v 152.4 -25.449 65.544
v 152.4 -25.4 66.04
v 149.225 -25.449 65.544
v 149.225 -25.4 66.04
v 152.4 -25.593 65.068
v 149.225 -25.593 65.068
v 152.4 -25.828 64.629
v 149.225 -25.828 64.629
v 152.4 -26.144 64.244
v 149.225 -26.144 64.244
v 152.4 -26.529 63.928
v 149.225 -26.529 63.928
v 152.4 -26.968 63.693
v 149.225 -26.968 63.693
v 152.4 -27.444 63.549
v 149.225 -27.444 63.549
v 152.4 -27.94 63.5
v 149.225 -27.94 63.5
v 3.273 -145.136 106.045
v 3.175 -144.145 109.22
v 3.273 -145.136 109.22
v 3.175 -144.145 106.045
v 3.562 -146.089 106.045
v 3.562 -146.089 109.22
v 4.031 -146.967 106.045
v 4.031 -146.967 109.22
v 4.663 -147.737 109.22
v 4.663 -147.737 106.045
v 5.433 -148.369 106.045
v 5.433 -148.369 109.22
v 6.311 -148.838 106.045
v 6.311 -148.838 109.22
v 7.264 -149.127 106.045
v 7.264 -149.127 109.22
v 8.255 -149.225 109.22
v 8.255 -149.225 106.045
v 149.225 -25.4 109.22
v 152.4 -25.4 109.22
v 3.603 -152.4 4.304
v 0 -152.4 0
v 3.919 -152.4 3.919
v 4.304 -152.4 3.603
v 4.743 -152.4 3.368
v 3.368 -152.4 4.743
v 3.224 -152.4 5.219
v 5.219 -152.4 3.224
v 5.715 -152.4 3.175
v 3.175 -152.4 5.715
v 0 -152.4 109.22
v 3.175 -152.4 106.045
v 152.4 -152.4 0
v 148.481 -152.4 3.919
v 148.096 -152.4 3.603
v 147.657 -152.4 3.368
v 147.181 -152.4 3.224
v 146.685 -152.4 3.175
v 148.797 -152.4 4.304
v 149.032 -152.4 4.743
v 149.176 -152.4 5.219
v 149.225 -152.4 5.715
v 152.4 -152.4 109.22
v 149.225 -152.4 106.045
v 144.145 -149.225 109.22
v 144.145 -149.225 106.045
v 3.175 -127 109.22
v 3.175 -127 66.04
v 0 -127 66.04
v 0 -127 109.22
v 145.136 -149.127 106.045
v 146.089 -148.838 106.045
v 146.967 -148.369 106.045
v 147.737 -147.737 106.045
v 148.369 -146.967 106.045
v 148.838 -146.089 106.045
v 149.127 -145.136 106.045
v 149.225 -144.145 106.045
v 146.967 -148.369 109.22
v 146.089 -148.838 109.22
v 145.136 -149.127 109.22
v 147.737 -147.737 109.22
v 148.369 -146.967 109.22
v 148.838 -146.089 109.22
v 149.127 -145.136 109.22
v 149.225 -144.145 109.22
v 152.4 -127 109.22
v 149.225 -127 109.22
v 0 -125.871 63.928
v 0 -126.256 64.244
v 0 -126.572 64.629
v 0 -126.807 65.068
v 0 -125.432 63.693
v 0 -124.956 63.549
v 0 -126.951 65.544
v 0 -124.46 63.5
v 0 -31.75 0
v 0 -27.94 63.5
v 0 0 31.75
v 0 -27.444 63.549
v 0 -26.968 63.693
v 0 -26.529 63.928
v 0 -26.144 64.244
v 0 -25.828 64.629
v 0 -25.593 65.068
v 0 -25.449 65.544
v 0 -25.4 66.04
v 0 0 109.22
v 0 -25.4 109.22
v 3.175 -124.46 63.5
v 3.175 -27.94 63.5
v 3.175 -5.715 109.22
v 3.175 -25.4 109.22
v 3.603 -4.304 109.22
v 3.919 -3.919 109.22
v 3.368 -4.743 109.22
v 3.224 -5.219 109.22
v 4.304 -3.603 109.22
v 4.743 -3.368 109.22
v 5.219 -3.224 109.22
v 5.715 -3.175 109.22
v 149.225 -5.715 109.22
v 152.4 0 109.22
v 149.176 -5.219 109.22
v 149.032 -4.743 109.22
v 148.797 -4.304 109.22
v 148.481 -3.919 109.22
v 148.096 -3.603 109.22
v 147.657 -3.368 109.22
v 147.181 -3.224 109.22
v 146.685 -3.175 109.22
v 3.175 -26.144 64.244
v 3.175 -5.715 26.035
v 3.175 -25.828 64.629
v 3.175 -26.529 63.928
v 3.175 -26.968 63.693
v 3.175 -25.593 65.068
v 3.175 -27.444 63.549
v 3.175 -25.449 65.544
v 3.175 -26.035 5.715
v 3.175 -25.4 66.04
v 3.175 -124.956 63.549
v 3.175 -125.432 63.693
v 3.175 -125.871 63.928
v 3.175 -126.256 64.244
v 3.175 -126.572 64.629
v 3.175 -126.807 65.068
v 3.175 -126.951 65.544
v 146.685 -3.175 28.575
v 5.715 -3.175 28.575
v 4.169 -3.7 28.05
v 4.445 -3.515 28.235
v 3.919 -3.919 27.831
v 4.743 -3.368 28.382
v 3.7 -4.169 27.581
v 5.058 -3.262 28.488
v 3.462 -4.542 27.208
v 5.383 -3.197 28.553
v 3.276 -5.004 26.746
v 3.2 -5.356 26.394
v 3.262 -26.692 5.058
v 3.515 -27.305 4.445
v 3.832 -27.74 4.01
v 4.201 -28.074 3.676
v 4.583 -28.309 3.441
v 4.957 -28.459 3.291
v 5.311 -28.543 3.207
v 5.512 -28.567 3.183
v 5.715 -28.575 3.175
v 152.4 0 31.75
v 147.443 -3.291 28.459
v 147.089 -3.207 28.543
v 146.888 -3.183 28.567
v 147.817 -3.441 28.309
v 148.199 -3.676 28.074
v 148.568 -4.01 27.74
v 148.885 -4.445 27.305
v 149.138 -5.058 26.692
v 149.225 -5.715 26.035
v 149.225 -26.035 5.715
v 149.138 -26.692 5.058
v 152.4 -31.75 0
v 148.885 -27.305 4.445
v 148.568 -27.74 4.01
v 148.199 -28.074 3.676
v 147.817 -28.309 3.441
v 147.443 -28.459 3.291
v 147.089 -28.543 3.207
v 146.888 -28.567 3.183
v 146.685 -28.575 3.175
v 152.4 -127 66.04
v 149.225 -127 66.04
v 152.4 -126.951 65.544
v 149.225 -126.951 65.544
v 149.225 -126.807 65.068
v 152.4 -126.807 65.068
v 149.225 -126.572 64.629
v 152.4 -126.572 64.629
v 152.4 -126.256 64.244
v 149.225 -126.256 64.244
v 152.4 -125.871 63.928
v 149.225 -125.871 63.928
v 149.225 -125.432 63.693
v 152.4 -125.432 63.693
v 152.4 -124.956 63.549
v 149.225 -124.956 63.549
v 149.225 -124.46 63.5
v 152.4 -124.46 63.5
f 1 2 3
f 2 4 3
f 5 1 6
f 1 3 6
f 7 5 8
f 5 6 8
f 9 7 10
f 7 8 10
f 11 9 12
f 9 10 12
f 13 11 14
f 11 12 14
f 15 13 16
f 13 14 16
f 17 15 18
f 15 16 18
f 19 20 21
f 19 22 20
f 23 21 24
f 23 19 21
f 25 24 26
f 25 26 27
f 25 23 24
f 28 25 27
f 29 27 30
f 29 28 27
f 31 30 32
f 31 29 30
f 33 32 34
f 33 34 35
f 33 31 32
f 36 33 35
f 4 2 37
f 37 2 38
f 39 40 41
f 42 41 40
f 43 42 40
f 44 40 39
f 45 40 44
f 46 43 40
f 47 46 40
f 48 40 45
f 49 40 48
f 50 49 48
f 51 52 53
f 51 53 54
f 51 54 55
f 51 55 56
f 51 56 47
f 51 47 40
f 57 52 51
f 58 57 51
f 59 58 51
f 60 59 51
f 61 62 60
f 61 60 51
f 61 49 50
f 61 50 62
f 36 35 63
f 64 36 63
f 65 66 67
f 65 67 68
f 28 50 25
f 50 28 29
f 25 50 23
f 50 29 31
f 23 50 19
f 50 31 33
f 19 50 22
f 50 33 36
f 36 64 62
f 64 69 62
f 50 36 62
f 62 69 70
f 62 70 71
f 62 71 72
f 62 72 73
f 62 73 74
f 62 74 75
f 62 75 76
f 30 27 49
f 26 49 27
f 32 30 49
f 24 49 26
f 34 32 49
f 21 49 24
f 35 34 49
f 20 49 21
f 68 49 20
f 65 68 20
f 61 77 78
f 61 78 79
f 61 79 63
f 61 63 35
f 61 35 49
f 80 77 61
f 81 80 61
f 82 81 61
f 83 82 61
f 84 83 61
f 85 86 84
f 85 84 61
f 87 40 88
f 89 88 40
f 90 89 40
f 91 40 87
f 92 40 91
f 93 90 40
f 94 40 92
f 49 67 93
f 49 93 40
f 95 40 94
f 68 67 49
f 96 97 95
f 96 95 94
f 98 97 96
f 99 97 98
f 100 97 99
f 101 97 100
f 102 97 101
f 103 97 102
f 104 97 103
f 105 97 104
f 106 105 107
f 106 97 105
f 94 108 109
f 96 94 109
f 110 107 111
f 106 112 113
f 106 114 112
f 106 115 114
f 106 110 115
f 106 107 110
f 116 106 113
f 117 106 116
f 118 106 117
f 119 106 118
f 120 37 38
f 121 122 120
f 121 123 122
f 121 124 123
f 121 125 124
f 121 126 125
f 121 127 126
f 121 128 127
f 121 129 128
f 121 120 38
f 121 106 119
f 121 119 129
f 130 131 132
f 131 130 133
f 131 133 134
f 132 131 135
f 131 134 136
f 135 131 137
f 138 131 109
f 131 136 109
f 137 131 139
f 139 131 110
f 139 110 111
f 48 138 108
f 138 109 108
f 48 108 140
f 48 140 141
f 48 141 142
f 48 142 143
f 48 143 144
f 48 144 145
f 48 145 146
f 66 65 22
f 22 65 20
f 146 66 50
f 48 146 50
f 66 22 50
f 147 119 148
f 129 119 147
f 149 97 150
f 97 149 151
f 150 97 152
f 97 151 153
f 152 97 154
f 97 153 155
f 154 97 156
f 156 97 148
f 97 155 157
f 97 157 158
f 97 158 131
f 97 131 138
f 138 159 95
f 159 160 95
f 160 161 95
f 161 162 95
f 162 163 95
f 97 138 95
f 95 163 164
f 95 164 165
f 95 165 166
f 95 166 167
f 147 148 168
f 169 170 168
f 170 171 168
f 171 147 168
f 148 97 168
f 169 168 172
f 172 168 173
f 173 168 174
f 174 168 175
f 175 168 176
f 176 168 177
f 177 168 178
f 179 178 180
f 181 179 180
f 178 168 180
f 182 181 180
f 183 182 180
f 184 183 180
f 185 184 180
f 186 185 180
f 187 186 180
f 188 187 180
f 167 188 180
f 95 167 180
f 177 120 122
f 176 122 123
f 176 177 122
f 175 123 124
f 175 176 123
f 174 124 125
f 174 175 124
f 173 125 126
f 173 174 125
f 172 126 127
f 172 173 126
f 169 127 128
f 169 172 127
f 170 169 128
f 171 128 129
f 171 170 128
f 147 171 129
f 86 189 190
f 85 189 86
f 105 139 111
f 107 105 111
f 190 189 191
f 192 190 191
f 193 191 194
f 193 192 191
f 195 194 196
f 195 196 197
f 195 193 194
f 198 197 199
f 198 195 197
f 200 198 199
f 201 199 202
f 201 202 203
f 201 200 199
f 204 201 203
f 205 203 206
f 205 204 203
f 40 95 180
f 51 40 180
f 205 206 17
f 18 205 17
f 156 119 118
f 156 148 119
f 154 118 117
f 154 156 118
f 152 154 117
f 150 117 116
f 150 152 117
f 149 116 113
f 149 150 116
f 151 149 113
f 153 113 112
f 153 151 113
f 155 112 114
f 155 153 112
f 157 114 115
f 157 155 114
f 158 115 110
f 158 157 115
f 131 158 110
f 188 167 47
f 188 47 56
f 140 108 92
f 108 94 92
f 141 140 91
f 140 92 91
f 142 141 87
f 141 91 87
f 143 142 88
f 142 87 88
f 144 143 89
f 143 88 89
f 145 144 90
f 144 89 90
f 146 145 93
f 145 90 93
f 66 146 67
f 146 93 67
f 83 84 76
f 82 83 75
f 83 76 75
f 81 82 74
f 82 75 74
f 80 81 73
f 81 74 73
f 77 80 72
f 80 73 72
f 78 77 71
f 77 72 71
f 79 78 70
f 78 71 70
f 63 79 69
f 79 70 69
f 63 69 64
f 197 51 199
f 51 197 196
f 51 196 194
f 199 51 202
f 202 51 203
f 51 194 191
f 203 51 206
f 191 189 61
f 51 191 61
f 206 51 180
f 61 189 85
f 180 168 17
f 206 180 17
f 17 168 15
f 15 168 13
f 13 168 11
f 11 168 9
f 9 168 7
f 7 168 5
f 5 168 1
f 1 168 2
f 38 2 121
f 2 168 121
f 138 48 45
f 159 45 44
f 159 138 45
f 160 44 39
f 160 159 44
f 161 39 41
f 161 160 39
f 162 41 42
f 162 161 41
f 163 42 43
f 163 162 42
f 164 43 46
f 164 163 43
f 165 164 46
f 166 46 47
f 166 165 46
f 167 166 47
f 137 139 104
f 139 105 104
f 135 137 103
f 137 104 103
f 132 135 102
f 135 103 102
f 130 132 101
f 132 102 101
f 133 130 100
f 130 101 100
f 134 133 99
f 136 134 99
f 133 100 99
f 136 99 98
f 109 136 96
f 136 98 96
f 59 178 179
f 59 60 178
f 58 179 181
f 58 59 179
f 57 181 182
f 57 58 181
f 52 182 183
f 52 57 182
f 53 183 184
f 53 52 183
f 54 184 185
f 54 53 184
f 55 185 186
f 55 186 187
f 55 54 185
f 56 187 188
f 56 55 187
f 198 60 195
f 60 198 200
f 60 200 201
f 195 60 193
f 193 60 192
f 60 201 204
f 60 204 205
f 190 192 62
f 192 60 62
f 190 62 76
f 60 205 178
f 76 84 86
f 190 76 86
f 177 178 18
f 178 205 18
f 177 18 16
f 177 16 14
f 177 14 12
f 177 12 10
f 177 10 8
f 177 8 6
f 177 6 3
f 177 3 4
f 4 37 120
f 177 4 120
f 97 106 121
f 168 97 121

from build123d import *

# Parameters (mm, degrees)
F0_W     = 152.4
F0_H     = 109.22
F1_DEPTH = 152.4
F2_T     = -3.175
F3_W     = 101.6
F3_H     = 45.72
F4_DEPTH = 152.401
F5_W     = 146.05
F5_H     = 22.225
F5_H_2   = 123.825
F6_DEPTH = 25.4
F8_DEPTH = 152.401
F9_R     = 2.54
F10_R    = 5.08


with BuildPart() as f1:
    # F0 (on Front) → F1 (new body)
    with BuildSketch(Plane.XZ):
        with Locations((76.2, 54.61)):
            Rectangle(F0_W, F0_H)
    extrude(amount=F1_DEPTH)

    # F2
    f2_openings = [f1.faces().sort_by_distance(p)[0] for p in [
        (76.2, -152.4, 54.61),
    ]]
    offset(amount=F2_T, openings=f2_openings)

    # F3 (on face) → F4 (cut, through all)
    with BuildSketch(Plane.YZ.offset(152.4)):
        with Locations((-76.2, 86.36)):
            Rectangle(F3_W, F3_H)
    extrude(amount=-F4_DEPTH, mode=Mode.SUBTRACT)

    # F5 (on face) → F6 (cut)
    with BuildSketch(Plane.XY.offset(109.22)):
        with Locations((76.2, -138.1125)):
            Rectangle(F5_W, F5_H)
        with Locations((76.2, -65.0875)):
            Rectangle(F5_W, F5_H_2)
    extrude(amount=-F6_DEPTH, mode=Mode.SUBTRACT)

    # F7 (on face) → F8 (cut, through all)
    with BuildSketch(Plane.YZ.offset(152.4)):
        Polygon((-31.75, 0), (0, 0), (0, 31.75), align=None)
    extrude(amount=-F8_DEPTH, mode=Mode.SUBTRACT)

    # F9
    f9_edges = [f1.edges().sort_by_distance(p)[0] for p in [
        (3.175, -90.4875, 3.175),
        (3.175, -3.175, 68.8975),
        (149.225, -3.175, 68.8975),
        (1.5875, -25.4, 63.5),
        (150.8125, -25.4, 63.5),
        (150.8125, -127, 63.5),
        (1.5875, -127, 63.5),
        (149.225, -90.4875, 3.175),
    ]]
    fillet(f9_edges, radius=F9_R)

    # F10
    f10_edges = [f1.edges().sort_by_distance(p)[0] for p in [
        (3.175, -149.225, 107.6325),
        (149.225, -149.225, 107.6325),
    ]]
    fillet(f10_edges, radius=F10_R)


solid = f1.part
